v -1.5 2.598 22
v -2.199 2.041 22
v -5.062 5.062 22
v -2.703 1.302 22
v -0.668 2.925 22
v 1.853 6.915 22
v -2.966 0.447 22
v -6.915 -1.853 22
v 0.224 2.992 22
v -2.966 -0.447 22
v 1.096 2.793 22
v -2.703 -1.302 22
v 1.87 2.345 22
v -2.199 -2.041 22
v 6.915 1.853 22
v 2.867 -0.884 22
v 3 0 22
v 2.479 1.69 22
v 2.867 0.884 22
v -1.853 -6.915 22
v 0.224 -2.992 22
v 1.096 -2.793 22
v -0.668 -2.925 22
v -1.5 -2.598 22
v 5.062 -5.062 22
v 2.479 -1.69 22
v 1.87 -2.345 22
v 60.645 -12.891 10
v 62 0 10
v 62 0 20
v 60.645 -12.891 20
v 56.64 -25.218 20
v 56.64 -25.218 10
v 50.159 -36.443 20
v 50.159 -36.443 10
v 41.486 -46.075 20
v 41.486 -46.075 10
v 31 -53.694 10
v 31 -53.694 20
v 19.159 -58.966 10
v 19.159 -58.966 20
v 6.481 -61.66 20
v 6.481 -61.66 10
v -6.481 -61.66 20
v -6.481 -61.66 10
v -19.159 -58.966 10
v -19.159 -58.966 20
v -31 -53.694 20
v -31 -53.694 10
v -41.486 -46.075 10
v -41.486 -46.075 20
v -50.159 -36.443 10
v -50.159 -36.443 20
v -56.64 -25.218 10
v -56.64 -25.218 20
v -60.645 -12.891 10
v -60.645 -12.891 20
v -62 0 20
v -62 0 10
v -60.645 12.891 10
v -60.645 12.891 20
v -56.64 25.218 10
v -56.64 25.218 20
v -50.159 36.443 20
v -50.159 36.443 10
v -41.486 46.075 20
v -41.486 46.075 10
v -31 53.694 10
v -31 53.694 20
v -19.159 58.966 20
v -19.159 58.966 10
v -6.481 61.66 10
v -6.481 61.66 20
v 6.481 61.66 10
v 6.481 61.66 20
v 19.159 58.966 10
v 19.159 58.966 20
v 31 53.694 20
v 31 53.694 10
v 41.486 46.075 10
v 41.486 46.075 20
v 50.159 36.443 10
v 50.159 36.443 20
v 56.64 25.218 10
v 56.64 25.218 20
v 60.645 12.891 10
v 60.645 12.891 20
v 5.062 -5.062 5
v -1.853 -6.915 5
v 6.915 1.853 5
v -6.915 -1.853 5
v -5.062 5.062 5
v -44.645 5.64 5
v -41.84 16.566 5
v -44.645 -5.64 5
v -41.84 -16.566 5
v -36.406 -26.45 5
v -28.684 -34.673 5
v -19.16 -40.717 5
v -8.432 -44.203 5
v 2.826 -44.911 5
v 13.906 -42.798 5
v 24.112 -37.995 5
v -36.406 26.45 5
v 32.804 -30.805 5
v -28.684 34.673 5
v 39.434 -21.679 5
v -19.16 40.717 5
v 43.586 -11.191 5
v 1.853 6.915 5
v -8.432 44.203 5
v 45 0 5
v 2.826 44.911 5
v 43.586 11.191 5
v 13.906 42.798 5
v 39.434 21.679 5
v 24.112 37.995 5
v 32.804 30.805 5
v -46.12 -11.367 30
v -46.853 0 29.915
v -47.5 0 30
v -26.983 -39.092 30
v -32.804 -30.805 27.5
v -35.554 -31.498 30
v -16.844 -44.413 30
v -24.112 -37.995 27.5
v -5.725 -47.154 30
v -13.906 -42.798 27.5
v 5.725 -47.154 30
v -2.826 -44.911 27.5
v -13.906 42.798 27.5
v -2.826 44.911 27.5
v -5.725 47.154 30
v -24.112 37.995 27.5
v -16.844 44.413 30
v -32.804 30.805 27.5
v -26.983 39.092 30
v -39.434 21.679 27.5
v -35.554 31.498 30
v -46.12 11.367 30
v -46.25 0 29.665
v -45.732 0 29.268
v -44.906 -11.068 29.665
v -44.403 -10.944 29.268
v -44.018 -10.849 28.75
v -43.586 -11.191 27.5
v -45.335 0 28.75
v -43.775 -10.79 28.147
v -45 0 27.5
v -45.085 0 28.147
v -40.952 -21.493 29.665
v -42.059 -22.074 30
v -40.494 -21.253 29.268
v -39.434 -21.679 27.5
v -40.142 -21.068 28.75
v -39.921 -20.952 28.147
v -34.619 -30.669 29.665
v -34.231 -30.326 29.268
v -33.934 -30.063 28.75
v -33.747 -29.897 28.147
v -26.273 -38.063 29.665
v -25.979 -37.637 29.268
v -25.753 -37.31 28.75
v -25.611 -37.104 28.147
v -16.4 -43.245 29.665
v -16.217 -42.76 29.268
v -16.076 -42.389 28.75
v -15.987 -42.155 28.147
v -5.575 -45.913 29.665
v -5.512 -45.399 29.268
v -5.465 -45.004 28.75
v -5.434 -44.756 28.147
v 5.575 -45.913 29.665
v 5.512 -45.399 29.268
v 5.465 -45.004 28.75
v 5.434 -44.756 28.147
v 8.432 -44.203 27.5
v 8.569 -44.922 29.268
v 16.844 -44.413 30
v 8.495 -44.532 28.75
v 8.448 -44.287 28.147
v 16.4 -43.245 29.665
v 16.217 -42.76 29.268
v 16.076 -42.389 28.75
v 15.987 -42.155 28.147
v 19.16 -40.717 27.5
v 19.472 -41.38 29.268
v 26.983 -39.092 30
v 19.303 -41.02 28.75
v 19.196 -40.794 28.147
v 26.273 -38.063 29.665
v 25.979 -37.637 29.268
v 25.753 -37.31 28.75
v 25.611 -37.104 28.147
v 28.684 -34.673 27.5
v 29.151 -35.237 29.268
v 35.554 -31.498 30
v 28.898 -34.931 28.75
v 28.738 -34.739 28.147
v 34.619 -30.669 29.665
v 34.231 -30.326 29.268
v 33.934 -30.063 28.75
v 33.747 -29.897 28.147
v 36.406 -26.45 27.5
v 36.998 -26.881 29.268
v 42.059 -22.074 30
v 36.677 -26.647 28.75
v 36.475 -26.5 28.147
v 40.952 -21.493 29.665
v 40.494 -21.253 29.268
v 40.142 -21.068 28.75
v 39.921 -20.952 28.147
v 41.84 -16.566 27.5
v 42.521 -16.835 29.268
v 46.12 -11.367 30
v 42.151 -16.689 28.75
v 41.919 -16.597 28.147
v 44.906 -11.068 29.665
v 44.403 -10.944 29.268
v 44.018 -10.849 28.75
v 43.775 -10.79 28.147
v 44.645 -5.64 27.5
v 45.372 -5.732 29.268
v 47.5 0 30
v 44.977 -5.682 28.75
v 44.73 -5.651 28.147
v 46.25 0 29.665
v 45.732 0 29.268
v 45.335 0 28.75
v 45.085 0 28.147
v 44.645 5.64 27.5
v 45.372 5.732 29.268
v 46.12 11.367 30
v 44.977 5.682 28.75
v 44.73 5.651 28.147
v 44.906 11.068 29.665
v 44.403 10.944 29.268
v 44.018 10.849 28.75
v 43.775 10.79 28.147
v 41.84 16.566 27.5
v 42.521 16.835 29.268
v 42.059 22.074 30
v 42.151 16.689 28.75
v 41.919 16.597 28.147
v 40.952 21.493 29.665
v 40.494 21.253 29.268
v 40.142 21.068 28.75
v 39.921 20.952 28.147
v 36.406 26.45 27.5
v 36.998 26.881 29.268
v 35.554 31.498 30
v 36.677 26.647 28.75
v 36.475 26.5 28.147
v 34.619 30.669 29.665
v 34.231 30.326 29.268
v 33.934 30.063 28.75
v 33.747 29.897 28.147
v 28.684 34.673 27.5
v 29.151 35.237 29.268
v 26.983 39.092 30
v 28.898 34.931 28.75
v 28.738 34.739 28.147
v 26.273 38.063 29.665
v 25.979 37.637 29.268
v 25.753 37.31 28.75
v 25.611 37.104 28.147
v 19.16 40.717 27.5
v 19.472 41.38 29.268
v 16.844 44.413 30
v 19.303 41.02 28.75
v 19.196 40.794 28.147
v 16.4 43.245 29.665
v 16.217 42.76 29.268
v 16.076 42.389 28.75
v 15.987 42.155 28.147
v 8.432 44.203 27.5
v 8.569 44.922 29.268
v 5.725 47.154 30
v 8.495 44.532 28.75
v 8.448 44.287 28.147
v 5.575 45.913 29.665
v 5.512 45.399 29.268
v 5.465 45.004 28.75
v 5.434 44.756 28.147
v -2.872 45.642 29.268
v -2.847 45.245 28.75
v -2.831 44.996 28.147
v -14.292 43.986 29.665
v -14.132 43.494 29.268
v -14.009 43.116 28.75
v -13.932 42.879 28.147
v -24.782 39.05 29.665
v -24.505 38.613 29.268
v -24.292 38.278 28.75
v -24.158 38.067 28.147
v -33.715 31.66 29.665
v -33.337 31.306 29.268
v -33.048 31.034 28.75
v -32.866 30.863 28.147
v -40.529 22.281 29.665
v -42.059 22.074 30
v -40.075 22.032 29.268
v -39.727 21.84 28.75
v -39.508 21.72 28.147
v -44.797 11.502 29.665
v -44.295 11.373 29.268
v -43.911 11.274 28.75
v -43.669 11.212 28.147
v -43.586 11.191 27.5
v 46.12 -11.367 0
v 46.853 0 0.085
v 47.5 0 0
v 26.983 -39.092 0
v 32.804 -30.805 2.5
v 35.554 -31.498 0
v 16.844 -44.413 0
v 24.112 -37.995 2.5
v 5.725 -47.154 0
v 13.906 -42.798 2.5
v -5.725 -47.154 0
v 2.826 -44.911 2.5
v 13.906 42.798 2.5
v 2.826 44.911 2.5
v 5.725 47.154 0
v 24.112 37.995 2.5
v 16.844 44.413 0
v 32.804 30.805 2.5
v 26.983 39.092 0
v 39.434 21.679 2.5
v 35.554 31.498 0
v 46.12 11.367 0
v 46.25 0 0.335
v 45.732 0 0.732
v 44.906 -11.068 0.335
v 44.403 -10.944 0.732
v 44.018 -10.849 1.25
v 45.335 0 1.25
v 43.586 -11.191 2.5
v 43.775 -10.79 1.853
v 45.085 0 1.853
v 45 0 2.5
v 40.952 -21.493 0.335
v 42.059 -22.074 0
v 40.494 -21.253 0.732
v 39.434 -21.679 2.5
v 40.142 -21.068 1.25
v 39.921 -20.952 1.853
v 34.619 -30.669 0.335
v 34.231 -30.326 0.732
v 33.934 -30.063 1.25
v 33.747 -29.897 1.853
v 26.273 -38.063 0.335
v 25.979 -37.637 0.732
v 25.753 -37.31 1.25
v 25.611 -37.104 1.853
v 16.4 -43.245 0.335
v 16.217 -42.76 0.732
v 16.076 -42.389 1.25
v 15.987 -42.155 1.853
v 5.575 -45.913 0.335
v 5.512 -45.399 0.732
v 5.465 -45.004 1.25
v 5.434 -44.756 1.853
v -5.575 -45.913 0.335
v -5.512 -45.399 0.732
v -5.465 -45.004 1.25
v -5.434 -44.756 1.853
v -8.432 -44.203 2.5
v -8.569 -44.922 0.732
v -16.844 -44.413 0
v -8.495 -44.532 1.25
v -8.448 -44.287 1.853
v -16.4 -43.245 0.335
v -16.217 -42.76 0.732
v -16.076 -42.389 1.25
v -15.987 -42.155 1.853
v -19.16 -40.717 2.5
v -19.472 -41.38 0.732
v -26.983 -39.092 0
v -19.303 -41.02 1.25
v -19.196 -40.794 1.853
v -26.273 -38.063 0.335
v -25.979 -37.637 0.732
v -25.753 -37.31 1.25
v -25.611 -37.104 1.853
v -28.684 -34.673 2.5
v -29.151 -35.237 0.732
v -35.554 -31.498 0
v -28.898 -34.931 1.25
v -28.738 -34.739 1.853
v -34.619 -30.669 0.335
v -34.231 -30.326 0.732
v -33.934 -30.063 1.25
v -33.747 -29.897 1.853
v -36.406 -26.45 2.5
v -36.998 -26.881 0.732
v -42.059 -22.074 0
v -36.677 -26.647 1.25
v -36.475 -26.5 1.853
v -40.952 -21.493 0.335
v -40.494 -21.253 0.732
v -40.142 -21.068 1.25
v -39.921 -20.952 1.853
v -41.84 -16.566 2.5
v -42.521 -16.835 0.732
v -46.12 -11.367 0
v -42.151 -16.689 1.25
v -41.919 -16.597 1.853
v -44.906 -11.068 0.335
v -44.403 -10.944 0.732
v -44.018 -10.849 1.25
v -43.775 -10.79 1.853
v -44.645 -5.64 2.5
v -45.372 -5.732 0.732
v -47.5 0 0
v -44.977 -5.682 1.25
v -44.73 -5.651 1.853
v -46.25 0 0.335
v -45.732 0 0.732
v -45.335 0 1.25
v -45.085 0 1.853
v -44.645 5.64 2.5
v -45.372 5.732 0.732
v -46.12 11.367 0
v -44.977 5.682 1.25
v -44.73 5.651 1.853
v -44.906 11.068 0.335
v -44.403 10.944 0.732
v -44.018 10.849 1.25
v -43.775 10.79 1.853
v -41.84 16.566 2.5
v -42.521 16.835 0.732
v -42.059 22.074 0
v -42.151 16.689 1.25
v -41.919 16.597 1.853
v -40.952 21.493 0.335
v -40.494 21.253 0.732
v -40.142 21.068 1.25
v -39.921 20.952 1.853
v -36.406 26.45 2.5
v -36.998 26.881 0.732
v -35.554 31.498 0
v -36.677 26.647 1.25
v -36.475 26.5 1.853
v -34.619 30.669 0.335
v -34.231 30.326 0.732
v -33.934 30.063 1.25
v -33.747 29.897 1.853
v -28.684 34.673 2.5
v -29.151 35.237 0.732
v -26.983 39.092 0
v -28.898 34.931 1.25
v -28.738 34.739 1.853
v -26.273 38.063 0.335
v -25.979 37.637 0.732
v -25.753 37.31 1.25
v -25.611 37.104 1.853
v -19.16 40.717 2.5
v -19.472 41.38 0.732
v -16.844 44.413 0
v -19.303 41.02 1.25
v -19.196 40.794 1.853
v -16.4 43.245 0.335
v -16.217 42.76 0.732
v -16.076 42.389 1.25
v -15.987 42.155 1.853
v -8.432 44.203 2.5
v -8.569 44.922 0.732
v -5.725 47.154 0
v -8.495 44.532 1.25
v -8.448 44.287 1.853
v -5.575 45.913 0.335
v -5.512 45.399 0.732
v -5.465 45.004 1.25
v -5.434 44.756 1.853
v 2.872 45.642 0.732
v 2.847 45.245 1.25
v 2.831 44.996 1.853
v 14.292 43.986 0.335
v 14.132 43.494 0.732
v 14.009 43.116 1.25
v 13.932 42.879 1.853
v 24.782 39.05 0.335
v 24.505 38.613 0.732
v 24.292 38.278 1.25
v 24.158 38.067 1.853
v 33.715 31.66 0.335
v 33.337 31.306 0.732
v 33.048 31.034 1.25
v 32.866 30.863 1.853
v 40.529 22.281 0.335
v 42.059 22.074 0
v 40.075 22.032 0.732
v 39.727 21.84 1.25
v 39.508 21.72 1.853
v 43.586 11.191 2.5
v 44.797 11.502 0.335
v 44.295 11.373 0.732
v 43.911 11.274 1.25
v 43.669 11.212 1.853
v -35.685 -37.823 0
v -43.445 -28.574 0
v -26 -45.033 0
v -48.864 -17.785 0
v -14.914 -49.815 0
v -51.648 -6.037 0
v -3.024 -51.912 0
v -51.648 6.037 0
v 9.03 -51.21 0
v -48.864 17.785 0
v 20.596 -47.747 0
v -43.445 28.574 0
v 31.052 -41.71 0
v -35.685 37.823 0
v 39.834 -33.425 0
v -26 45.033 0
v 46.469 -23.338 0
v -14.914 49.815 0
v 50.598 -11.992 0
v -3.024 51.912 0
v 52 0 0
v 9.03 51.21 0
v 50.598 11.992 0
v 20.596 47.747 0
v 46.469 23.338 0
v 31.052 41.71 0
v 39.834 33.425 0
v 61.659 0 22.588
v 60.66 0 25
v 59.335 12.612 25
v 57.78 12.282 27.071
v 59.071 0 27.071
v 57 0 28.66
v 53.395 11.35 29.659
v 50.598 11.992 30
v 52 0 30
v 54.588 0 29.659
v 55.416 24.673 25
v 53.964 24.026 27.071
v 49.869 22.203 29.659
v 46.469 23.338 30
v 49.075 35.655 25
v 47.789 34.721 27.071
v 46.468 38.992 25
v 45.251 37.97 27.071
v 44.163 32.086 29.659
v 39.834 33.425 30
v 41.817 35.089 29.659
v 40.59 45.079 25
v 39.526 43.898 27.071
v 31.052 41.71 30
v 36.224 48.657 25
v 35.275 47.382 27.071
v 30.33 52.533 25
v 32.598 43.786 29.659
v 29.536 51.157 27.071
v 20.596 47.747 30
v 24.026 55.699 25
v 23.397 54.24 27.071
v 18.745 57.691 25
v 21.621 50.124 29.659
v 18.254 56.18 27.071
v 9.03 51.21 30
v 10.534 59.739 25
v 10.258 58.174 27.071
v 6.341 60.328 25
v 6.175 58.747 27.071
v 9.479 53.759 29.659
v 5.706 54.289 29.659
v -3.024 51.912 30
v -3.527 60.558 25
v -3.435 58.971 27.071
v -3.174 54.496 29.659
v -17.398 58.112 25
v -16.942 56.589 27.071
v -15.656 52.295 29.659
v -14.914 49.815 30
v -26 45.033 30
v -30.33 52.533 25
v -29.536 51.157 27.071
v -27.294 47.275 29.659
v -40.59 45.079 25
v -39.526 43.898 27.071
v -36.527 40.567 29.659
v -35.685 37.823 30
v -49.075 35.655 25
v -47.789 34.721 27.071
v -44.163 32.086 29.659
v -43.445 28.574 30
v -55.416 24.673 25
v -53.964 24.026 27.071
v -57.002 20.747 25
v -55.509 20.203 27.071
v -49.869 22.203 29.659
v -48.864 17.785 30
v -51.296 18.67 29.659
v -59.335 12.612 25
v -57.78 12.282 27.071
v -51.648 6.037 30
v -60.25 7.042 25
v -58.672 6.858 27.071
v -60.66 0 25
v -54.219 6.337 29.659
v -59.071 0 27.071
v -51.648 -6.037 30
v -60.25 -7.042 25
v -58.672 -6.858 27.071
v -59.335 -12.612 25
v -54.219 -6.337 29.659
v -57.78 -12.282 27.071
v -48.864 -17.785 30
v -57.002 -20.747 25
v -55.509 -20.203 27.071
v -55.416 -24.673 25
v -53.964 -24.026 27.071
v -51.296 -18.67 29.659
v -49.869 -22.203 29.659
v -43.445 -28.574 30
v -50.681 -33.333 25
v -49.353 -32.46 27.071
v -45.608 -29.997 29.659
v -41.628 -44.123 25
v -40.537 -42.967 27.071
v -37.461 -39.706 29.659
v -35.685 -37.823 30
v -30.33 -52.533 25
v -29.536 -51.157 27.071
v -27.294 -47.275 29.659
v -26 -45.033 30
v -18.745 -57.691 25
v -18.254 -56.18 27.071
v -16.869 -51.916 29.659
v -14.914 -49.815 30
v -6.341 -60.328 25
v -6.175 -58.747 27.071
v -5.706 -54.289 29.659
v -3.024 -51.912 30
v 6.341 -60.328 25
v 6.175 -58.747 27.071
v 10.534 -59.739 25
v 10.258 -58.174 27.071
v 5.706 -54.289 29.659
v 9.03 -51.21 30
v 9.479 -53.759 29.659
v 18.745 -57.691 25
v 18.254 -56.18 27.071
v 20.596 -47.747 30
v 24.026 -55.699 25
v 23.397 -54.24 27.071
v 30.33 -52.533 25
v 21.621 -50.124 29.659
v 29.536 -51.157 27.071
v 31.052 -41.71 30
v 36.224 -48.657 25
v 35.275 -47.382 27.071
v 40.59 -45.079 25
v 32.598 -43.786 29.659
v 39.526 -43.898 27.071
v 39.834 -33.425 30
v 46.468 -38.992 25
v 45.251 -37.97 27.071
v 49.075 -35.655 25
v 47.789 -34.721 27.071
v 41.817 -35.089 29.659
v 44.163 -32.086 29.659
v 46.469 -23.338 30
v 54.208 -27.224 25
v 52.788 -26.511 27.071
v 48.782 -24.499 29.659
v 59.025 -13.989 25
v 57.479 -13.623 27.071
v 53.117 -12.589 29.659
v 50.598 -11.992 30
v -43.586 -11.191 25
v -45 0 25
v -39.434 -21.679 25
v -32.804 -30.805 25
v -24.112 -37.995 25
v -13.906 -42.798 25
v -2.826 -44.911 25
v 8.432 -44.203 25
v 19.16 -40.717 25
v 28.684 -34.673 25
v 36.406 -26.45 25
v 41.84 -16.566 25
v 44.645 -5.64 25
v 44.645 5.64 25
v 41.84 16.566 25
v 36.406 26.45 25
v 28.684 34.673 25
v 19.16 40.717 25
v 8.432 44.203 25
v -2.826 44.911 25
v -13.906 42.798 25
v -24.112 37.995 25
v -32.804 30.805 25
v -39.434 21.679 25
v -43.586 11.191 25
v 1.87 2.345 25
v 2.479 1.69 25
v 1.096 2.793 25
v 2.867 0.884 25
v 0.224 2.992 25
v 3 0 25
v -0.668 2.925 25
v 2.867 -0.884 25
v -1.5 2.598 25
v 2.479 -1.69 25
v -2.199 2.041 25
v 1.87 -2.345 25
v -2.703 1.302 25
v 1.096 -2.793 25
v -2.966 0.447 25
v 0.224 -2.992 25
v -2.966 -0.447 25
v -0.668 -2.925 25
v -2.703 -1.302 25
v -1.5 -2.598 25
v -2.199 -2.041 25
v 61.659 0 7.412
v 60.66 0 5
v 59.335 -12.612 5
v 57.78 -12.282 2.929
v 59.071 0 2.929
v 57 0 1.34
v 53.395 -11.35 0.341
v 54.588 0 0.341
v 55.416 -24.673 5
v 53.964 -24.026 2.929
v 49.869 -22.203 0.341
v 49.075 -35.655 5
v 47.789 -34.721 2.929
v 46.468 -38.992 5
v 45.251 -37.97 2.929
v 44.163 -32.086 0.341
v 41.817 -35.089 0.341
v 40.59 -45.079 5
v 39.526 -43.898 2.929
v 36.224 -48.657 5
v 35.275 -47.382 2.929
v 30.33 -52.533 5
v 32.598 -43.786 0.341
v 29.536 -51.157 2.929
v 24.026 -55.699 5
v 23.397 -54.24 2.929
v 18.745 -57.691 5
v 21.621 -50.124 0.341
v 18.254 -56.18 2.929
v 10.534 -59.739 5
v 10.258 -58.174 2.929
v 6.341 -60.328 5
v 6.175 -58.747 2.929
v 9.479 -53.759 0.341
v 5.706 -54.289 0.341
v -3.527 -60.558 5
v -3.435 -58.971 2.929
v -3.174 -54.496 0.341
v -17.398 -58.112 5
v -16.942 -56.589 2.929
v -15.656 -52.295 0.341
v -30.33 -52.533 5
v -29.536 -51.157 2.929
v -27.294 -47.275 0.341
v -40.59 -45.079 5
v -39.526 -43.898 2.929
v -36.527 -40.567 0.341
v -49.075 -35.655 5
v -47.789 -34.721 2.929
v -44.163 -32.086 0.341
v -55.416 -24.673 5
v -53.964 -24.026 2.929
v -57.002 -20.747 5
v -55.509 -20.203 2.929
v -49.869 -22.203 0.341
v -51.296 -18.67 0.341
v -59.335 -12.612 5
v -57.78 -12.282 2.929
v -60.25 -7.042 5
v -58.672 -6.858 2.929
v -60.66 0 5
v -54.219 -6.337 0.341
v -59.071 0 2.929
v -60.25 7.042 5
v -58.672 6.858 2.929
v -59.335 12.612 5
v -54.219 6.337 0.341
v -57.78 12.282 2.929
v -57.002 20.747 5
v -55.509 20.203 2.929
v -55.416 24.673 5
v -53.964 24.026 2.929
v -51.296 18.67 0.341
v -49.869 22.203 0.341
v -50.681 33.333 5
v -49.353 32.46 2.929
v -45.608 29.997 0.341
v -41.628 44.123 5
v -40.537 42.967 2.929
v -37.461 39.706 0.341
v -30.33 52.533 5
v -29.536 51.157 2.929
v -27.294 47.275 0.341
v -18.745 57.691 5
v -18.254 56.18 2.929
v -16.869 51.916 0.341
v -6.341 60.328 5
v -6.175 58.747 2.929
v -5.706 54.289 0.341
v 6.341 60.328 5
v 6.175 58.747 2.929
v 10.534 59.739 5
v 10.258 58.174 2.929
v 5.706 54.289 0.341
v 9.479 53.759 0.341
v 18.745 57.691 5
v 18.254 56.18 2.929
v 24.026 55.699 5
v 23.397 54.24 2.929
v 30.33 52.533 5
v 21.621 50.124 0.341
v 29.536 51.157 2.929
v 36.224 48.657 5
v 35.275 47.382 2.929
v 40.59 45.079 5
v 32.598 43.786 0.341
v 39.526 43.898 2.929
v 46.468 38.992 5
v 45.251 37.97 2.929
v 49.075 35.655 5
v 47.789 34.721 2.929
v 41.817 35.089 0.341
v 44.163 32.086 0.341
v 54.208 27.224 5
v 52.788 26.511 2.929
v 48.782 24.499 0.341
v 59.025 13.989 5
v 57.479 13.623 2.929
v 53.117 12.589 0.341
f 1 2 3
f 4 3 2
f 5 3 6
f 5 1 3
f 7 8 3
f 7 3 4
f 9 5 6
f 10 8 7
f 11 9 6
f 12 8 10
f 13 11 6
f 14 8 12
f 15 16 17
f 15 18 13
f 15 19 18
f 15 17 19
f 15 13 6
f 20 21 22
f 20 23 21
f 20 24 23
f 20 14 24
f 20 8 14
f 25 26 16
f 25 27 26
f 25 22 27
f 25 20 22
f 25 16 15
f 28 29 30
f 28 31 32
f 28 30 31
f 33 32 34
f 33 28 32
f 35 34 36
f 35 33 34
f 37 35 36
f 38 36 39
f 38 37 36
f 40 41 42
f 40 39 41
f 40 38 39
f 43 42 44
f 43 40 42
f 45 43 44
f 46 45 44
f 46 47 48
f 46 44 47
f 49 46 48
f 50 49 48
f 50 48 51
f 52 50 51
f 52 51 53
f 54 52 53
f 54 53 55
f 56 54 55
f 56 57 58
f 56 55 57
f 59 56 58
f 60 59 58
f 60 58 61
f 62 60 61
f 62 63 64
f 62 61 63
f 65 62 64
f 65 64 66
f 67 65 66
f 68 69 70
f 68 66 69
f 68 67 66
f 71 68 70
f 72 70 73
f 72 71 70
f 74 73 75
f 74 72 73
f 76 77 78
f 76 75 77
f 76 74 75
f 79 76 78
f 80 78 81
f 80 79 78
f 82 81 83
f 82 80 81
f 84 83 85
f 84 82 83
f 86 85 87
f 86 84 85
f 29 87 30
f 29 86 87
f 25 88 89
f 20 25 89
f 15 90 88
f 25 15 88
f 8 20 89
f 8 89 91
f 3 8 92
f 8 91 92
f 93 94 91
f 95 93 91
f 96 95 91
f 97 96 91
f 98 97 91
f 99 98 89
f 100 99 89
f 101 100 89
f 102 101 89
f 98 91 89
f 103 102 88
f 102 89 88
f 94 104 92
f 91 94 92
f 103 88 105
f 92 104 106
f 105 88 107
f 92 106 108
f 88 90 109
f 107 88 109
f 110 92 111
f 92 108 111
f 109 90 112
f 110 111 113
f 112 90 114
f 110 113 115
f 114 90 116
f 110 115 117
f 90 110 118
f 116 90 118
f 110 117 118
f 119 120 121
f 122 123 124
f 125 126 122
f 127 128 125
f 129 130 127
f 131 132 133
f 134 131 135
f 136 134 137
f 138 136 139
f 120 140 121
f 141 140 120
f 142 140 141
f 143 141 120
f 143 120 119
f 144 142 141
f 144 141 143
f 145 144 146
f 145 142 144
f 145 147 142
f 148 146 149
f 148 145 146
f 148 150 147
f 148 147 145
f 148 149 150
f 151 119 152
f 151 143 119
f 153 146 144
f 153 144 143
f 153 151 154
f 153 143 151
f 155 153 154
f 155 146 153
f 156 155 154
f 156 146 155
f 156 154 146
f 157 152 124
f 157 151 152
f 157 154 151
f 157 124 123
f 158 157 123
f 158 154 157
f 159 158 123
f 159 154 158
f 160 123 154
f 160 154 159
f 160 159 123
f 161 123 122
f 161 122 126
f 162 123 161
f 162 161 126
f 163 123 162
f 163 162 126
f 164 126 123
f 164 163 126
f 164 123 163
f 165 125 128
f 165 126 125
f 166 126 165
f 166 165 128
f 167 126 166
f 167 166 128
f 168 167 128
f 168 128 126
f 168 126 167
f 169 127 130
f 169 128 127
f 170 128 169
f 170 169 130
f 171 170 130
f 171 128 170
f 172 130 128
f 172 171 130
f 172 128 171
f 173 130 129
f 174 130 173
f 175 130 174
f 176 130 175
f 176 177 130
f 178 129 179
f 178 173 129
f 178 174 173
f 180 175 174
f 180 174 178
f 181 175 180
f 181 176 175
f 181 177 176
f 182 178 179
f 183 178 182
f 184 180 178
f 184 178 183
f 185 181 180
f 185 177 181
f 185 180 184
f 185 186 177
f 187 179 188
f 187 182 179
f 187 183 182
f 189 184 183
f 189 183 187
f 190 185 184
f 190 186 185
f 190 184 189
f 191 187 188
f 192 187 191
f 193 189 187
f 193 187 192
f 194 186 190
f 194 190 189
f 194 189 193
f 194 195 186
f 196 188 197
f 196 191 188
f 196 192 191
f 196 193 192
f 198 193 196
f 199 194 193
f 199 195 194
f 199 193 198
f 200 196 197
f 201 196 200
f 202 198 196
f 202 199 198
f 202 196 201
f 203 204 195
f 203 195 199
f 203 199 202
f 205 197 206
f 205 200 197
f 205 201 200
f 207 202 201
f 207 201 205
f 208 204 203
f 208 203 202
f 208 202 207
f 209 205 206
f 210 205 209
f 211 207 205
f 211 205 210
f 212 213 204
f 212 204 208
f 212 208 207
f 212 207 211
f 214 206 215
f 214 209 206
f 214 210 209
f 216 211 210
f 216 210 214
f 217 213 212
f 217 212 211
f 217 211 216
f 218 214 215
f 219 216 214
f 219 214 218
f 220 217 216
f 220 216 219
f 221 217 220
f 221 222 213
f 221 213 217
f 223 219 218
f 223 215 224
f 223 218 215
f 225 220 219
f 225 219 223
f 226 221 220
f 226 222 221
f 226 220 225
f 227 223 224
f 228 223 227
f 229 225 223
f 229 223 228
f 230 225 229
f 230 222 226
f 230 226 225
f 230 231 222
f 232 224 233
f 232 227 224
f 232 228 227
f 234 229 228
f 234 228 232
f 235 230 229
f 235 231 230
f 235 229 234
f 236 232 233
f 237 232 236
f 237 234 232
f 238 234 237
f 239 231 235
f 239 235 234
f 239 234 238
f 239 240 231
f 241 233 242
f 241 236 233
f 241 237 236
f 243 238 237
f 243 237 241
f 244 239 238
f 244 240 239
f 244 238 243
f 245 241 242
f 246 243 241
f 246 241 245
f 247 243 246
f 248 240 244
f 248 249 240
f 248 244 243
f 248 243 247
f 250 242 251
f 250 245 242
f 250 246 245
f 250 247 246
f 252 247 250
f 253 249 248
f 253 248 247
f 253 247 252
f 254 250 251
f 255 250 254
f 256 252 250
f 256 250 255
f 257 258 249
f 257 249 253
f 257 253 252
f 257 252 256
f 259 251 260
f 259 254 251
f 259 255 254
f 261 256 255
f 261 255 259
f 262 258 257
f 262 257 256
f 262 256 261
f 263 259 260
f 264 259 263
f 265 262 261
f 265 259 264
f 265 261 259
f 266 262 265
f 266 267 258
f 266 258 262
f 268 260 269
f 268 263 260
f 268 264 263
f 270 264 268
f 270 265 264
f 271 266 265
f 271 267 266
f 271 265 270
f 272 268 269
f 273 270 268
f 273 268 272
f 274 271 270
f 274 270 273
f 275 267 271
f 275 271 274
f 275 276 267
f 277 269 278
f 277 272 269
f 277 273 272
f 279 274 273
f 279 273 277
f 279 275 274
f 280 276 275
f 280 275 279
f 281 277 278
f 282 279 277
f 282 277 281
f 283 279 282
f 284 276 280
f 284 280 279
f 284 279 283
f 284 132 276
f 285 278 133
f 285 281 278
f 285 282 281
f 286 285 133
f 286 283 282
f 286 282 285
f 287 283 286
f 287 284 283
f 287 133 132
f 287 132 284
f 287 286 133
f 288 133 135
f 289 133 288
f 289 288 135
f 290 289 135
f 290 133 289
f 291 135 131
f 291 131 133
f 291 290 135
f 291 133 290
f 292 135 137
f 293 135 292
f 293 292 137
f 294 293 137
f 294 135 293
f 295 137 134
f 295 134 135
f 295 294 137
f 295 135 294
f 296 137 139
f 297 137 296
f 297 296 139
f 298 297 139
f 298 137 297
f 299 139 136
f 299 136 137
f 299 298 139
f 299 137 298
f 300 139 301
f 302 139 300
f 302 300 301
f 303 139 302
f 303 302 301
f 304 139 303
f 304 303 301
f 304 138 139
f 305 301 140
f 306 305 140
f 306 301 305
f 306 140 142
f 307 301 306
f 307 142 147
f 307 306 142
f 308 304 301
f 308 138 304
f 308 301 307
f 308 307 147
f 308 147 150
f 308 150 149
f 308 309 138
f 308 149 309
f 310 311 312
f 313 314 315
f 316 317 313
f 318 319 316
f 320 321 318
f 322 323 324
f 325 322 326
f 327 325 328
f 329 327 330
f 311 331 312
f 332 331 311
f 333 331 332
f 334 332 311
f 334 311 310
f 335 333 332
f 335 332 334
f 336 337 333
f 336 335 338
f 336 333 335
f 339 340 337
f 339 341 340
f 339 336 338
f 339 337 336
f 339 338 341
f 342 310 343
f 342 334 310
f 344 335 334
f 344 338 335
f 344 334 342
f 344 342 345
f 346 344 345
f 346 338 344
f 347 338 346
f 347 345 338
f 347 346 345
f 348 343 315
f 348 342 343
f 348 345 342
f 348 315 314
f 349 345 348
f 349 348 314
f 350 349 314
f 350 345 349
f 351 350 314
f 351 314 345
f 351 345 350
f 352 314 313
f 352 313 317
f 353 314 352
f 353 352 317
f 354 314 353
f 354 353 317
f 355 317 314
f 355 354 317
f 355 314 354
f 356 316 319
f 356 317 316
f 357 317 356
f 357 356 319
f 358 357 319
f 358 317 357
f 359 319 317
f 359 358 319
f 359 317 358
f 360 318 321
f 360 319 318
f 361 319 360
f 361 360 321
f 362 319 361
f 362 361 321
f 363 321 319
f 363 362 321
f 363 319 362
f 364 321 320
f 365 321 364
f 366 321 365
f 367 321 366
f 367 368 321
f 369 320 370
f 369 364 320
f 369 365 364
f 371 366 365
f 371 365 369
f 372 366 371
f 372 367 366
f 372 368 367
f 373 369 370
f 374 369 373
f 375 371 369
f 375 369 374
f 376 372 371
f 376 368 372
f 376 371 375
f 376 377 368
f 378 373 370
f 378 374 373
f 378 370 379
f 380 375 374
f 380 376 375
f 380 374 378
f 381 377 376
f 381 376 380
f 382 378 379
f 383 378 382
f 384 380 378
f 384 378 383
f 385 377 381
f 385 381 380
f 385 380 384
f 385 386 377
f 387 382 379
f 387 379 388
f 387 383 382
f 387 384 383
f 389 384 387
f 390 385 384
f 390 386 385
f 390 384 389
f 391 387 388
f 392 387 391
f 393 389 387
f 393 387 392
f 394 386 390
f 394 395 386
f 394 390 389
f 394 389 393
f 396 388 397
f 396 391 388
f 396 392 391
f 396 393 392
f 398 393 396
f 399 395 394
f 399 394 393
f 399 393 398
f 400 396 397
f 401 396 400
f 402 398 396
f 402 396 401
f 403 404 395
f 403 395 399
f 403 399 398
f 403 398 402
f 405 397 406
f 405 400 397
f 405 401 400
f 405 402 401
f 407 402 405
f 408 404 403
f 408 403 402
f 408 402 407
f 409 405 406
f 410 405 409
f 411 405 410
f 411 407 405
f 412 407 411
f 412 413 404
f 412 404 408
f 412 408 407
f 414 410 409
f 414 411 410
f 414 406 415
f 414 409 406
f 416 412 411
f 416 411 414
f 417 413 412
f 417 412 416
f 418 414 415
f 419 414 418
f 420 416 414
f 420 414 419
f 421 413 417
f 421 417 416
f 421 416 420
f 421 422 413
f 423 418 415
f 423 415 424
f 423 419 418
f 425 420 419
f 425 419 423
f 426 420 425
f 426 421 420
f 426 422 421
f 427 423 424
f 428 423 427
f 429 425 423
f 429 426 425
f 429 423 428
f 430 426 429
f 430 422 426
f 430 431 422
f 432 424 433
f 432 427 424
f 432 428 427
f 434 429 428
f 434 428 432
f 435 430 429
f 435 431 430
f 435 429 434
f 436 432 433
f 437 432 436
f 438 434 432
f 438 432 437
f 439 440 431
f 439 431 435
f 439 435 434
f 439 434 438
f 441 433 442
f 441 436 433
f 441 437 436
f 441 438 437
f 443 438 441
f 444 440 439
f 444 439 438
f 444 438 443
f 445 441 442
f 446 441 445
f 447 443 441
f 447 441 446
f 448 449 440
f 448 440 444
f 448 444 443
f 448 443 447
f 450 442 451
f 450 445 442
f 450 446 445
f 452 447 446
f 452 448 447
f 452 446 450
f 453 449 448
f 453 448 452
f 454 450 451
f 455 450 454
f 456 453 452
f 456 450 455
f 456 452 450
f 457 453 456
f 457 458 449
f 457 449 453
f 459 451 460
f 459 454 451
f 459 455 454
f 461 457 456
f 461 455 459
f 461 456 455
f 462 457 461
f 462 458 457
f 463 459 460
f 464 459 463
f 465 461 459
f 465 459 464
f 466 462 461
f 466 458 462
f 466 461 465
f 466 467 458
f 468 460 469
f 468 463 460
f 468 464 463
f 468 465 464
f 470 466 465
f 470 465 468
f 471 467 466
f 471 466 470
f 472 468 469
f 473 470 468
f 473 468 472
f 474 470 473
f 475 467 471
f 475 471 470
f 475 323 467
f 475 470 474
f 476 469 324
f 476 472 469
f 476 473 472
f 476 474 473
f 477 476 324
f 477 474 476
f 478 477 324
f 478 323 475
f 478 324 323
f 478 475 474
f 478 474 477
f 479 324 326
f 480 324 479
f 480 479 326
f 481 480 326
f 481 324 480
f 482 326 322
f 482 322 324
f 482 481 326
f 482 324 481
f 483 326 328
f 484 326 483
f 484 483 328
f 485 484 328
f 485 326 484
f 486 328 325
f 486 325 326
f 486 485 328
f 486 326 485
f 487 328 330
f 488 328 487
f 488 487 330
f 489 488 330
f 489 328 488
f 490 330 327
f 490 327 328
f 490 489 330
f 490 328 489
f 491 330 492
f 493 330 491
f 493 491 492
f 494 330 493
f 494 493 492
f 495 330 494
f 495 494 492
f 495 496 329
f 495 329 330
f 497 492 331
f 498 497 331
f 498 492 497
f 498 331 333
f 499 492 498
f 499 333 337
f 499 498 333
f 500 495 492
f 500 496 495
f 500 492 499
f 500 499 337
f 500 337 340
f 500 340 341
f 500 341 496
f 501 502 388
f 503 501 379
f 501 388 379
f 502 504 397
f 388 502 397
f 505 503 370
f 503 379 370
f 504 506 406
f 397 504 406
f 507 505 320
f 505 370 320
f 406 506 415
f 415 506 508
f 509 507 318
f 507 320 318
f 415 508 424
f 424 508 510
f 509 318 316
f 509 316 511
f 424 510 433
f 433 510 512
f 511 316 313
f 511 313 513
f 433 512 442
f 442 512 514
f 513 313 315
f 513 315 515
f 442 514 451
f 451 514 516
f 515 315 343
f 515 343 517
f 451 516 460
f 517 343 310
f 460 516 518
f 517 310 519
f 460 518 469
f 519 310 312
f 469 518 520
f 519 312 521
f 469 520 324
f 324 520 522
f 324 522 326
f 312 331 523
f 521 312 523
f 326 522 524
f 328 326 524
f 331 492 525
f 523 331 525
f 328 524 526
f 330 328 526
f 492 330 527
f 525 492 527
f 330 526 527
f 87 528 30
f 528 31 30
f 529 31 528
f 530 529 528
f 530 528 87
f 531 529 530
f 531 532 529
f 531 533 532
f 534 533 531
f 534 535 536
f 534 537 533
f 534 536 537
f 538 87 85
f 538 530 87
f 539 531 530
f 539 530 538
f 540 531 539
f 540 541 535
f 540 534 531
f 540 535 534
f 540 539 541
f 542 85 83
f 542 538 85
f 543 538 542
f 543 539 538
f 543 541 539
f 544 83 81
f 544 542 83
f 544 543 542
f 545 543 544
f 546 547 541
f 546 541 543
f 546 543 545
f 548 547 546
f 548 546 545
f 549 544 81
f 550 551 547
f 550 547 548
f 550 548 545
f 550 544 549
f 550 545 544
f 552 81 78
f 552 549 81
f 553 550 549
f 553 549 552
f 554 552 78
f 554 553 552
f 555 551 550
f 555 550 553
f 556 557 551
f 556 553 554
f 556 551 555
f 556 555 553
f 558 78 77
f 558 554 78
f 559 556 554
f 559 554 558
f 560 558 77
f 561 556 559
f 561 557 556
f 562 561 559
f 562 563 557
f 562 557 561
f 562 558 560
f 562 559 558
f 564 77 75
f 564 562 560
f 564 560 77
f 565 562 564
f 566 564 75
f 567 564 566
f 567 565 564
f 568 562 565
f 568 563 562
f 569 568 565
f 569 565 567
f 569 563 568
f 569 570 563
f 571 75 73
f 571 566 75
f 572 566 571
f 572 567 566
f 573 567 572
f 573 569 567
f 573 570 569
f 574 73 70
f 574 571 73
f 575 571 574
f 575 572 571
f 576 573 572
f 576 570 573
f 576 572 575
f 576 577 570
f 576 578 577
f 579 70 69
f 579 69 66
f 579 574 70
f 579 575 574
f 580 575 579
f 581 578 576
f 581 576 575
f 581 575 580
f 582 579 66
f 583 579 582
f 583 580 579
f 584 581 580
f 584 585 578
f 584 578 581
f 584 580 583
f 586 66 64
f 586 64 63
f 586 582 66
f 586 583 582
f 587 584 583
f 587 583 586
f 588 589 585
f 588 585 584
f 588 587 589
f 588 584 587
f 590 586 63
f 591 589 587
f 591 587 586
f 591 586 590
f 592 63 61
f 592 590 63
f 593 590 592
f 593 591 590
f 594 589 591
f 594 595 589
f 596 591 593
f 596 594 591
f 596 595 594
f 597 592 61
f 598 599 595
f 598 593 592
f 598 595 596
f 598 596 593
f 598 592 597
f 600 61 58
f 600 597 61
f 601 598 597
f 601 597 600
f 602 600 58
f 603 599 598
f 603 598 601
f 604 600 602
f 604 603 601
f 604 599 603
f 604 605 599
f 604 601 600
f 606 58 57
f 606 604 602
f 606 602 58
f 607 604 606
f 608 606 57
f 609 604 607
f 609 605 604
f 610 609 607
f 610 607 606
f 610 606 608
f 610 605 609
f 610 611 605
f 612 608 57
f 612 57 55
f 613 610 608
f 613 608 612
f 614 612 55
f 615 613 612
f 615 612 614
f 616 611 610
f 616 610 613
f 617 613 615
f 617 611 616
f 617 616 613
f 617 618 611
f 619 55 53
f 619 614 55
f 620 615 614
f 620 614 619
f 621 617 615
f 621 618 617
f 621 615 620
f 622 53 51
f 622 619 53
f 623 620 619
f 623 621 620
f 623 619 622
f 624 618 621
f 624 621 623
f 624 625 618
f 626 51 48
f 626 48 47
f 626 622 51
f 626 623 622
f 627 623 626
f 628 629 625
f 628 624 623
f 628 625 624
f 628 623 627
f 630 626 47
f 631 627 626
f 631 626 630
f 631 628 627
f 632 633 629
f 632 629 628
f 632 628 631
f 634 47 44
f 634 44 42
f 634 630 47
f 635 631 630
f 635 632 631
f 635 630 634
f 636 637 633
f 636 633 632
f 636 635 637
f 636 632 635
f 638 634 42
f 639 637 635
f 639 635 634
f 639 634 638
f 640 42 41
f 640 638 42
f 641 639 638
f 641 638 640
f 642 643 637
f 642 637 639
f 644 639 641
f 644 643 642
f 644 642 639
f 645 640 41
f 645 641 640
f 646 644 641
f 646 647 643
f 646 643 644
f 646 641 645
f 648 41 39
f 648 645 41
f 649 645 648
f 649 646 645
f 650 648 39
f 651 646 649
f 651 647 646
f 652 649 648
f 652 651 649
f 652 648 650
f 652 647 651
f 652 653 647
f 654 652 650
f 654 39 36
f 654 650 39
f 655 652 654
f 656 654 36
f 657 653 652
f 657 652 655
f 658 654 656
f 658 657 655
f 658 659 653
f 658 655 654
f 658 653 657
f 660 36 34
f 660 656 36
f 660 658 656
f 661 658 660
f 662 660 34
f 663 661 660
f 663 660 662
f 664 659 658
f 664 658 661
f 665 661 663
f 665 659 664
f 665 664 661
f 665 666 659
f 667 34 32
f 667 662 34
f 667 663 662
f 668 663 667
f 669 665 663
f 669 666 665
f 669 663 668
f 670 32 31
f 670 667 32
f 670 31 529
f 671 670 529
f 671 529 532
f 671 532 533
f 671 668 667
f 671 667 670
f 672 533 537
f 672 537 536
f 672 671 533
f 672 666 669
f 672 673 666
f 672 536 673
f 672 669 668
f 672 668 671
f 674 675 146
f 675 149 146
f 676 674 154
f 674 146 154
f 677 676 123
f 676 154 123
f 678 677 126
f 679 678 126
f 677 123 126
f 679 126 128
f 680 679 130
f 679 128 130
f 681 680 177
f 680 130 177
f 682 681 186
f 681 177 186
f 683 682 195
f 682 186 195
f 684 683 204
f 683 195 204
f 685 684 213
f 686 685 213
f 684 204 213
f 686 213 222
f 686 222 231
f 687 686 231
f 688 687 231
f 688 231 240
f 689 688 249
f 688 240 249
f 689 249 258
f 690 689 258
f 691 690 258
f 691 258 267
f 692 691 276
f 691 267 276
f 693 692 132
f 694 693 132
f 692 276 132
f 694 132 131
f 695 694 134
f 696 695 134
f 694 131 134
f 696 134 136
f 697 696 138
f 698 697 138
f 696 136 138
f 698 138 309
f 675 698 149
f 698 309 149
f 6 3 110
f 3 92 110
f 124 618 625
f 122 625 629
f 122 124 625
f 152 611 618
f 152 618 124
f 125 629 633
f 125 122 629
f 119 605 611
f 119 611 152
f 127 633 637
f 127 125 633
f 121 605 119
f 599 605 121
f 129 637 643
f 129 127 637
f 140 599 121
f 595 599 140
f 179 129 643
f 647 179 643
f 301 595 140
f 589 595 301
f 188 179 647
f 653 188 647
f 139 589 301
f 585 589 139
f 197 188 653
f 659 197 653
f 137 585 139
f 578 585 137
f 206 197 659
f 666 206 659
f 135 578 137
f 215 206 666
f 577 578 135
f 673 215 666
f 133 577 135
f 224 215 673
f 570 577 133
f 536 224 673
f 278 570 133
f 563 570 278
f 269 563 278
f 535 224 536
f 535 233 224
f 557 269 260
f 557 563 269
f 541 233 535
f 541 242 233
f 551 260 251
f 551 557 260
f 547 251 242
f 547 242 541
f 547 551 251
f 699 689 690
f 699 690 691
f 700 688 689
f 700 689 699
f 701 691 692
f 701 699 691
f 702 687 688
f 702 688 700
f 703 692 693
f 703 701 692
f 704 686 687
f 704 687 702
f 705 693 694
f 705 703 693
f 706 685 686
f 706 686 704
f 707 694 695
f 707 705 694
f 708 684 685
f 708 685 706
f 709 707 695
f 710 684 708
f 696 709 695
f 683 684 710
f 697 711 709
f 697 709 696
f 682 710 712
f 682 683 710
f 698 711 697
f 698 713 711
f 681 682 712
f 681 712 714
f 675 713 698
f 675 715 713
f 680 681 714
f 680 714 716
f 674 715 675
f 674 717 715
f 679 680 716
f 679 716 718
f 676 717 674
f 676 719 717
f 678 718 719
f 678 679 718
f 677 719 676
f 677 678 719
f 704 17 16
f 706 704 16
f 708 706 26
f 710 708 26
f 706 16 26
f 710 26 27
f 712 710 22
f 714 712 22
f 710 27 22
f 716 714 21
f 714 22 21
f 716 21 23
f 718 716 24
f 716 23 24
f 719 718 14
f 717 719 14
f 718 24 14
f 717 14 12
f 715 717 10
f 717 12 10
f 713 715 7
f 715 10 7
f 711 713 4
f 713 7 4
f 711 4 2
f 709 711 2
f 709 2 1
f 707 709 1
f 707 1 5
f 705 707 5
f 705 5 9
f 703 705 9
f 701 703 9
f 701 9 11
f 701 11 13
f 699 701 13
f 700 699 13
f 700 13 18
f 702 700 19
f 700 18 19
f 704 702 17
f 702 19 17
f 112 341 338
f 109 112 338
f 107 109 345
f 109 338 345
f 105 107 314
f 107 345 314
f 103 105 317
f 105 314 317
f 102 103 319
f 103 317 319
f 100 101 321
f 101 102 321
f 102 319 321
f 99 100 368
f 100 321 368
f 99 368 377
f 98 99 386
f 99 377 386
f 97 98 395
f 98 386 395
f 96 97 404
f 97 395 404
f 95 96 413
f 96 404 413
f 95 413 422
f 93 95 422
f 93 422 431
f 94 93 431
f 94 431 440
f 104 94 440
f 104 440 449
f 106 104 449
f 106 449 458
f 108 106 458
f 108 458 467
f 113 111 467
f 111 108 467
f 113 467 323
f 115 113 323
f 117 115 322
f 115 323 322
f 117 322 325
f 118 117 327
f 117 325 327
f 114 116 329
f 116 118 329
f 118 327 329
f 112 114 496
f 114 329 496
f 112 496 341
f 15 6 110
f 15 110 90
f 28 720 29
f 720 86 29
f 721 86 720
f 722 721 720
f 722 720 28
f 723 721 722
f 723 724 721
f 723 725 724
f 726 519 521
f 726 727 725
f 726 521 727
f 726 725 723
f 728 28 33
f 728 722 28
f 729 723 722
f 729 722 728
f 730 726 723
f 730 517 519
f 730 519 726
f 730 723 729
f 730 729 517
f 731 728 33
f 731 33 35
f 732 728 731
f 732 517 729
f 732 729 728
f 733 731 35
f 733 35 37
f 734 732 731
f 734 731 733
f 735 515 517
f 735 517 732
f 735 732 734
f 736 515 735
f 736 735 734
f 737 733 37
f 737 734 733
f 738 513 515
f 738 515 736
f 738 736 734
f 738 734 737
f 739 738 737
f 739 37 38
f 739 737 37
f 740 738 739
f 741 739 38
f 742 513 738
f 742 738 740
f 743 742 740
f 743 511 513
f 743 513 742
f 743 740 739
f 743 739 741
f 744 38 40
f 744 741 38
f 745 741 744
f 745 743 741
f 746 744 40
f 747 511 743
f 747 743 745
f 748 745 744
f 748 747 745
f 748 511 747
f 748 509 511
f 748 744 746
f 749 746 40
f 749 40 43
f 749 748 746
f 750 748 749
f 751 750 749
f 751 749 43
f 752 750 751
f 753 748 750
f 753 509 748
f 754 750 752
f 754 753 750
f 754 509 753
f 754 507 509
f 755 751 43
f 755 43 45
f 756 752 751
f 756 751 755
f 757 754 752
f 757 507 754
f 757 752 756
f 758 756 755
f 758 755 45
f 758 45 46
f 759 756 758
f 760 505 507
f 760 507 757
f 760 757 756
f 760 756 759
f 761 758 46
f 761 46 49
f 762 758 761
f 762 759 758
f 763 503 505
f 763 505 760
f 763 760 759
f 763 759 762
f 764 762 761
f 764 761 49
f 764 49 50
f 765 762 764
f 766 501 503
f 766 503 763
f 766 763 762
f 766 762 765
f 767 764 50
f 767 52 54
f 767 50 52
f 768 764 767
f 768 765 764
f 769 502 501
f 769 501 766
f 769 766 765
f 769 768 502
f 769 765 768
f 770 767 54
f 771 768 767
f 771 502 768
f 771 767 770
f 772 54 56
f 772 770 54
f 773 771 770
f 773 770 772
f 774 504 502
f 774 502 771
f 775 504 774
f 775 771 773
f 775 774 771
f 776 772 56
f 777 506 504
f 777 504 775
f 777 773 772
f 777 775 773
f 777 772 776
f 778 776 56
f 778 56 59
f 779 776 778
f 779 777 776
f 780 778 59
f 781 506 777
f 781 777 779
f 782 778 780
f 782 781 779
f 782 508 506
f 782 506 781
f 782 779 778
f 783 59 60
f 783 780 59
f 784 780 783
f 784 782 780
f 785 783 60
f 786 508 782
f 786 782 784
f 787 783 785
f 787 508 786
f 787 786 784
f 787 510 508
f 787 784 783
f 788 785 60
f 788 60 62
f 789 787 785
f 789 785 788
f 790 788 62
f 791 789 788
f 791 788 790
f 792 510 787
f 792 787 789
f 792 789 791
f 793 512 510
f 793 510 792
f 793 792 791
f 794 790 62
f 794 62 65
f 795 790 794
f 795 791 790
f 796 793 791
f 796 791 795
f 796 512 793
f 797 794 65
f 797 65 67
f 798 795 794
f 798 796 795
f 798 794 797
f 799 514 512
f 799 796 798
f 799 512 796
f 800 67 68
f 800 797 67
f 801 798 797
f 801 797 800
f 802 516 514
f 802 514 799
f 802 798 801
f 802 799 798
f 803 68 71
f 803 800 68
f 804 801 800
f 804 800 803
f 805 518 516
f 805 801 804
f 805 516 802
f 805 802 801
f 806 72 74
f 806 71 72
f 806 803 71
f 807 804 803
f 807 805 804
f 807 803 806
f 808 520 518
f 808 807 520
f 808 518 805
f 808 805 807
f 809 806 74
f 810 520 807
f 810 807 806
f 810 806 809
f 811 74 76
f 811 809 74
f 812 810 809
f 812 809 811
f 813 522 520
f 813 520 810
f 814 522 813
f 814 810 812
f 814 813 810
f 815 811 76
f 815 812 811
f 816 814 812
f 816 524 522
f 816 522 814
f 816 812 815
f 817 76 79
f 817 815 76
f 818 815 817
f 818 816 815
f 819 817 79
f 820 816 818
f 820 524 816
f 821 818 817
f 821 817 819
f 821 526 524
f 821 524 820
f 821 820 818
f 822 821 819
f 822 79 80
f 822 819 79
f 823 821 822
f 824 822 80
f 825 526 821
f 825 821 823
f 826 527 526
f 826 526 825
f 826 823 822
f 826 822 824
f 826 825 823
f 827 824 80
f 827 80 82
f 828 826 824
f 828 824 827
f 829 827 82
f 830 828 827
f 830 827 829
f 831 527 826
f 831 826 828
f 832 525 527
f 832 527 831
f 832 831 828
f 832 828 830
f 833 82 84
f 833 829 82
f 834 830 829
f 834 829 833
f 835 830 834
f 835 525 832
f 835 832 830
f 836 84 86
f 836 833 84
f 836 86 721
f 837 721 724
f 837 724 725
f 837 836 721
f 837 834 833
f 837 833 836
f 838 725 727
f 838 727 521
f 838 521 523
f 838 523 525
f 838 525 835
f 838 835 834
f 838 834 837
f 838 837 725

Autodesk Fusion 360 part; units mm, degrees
sketch "Sketch1" plane through (0, 0, 0) normal (0, 0, 1) x (1, 0, 0)
  circle A0 centre (0, 0) radius 62
  circle A1 centre (0, 0) radius 45
  circle A2 centre (0, 0) radius 3
  dimension "d1" = 124
  dimension "d5" = 90
  dimension "d14" = 6
extrude "Extrude1" add sketch "Sketch1" along normal blind 30 contours A0 | A1 | A2
fillet "Fillet1" radius 10 2 edges at (-57.8043, -22.4202, 30) (-57.8043, -22.4202, 0)
sketch "Sketch4" plane through (0, 0, 0) normal (0, 0, -1) x (1, 0, 0)
  circle A0 centre (0, 0) radius 52
  line L0 (6.9152, -1.8529) -> (5.0623, 5.0623)
  line L1 (5.0623, 5.0623) -> (-1.8529, 6.9152)
  line L2 (-1.8529, 6.9152) -> (-6.9152, 1.8529)
  line L3 (-6.9152, 1.8529) -> (-5.0623, -5.0623)
  line L4 (-5.0623, -5.0623) -> (1.8529, -6.9152)
  line L5 (1.8529, -6.9152) -> (6.9152, -1.8529)
  dimension "d16" = 12.4
extrude "Extrude5" cut sketch "Sketch4" against normal blind 22 contours L0 L1 L2 L3 L4 L5
extrude "Extrude2" cut sketch "Sketch1" along normal blind 5 contours A1 | A2
sketch "Sketch3" plane through (0, 0, 30) normal (0, 0, 1) x (-1, 0, 0)
  circle A0 centre (0, 0) radius 52
  circle A1 centre (0, 0) radius 45
  dimension "d9" = 90
extrude "Extrude3" cut sketch "Sketch3" against normal blind 5 contours A1
fillet "Fillet2" radius 2.5 1 edges at (41.9547, -16.2727, 30)
fillet "Fillet3" radius 2.5 1 edges at (-41.9547, -16.2727, 0)
extrude "Extrude4" cut sketch "Sketch1" along normal through all contours A2
